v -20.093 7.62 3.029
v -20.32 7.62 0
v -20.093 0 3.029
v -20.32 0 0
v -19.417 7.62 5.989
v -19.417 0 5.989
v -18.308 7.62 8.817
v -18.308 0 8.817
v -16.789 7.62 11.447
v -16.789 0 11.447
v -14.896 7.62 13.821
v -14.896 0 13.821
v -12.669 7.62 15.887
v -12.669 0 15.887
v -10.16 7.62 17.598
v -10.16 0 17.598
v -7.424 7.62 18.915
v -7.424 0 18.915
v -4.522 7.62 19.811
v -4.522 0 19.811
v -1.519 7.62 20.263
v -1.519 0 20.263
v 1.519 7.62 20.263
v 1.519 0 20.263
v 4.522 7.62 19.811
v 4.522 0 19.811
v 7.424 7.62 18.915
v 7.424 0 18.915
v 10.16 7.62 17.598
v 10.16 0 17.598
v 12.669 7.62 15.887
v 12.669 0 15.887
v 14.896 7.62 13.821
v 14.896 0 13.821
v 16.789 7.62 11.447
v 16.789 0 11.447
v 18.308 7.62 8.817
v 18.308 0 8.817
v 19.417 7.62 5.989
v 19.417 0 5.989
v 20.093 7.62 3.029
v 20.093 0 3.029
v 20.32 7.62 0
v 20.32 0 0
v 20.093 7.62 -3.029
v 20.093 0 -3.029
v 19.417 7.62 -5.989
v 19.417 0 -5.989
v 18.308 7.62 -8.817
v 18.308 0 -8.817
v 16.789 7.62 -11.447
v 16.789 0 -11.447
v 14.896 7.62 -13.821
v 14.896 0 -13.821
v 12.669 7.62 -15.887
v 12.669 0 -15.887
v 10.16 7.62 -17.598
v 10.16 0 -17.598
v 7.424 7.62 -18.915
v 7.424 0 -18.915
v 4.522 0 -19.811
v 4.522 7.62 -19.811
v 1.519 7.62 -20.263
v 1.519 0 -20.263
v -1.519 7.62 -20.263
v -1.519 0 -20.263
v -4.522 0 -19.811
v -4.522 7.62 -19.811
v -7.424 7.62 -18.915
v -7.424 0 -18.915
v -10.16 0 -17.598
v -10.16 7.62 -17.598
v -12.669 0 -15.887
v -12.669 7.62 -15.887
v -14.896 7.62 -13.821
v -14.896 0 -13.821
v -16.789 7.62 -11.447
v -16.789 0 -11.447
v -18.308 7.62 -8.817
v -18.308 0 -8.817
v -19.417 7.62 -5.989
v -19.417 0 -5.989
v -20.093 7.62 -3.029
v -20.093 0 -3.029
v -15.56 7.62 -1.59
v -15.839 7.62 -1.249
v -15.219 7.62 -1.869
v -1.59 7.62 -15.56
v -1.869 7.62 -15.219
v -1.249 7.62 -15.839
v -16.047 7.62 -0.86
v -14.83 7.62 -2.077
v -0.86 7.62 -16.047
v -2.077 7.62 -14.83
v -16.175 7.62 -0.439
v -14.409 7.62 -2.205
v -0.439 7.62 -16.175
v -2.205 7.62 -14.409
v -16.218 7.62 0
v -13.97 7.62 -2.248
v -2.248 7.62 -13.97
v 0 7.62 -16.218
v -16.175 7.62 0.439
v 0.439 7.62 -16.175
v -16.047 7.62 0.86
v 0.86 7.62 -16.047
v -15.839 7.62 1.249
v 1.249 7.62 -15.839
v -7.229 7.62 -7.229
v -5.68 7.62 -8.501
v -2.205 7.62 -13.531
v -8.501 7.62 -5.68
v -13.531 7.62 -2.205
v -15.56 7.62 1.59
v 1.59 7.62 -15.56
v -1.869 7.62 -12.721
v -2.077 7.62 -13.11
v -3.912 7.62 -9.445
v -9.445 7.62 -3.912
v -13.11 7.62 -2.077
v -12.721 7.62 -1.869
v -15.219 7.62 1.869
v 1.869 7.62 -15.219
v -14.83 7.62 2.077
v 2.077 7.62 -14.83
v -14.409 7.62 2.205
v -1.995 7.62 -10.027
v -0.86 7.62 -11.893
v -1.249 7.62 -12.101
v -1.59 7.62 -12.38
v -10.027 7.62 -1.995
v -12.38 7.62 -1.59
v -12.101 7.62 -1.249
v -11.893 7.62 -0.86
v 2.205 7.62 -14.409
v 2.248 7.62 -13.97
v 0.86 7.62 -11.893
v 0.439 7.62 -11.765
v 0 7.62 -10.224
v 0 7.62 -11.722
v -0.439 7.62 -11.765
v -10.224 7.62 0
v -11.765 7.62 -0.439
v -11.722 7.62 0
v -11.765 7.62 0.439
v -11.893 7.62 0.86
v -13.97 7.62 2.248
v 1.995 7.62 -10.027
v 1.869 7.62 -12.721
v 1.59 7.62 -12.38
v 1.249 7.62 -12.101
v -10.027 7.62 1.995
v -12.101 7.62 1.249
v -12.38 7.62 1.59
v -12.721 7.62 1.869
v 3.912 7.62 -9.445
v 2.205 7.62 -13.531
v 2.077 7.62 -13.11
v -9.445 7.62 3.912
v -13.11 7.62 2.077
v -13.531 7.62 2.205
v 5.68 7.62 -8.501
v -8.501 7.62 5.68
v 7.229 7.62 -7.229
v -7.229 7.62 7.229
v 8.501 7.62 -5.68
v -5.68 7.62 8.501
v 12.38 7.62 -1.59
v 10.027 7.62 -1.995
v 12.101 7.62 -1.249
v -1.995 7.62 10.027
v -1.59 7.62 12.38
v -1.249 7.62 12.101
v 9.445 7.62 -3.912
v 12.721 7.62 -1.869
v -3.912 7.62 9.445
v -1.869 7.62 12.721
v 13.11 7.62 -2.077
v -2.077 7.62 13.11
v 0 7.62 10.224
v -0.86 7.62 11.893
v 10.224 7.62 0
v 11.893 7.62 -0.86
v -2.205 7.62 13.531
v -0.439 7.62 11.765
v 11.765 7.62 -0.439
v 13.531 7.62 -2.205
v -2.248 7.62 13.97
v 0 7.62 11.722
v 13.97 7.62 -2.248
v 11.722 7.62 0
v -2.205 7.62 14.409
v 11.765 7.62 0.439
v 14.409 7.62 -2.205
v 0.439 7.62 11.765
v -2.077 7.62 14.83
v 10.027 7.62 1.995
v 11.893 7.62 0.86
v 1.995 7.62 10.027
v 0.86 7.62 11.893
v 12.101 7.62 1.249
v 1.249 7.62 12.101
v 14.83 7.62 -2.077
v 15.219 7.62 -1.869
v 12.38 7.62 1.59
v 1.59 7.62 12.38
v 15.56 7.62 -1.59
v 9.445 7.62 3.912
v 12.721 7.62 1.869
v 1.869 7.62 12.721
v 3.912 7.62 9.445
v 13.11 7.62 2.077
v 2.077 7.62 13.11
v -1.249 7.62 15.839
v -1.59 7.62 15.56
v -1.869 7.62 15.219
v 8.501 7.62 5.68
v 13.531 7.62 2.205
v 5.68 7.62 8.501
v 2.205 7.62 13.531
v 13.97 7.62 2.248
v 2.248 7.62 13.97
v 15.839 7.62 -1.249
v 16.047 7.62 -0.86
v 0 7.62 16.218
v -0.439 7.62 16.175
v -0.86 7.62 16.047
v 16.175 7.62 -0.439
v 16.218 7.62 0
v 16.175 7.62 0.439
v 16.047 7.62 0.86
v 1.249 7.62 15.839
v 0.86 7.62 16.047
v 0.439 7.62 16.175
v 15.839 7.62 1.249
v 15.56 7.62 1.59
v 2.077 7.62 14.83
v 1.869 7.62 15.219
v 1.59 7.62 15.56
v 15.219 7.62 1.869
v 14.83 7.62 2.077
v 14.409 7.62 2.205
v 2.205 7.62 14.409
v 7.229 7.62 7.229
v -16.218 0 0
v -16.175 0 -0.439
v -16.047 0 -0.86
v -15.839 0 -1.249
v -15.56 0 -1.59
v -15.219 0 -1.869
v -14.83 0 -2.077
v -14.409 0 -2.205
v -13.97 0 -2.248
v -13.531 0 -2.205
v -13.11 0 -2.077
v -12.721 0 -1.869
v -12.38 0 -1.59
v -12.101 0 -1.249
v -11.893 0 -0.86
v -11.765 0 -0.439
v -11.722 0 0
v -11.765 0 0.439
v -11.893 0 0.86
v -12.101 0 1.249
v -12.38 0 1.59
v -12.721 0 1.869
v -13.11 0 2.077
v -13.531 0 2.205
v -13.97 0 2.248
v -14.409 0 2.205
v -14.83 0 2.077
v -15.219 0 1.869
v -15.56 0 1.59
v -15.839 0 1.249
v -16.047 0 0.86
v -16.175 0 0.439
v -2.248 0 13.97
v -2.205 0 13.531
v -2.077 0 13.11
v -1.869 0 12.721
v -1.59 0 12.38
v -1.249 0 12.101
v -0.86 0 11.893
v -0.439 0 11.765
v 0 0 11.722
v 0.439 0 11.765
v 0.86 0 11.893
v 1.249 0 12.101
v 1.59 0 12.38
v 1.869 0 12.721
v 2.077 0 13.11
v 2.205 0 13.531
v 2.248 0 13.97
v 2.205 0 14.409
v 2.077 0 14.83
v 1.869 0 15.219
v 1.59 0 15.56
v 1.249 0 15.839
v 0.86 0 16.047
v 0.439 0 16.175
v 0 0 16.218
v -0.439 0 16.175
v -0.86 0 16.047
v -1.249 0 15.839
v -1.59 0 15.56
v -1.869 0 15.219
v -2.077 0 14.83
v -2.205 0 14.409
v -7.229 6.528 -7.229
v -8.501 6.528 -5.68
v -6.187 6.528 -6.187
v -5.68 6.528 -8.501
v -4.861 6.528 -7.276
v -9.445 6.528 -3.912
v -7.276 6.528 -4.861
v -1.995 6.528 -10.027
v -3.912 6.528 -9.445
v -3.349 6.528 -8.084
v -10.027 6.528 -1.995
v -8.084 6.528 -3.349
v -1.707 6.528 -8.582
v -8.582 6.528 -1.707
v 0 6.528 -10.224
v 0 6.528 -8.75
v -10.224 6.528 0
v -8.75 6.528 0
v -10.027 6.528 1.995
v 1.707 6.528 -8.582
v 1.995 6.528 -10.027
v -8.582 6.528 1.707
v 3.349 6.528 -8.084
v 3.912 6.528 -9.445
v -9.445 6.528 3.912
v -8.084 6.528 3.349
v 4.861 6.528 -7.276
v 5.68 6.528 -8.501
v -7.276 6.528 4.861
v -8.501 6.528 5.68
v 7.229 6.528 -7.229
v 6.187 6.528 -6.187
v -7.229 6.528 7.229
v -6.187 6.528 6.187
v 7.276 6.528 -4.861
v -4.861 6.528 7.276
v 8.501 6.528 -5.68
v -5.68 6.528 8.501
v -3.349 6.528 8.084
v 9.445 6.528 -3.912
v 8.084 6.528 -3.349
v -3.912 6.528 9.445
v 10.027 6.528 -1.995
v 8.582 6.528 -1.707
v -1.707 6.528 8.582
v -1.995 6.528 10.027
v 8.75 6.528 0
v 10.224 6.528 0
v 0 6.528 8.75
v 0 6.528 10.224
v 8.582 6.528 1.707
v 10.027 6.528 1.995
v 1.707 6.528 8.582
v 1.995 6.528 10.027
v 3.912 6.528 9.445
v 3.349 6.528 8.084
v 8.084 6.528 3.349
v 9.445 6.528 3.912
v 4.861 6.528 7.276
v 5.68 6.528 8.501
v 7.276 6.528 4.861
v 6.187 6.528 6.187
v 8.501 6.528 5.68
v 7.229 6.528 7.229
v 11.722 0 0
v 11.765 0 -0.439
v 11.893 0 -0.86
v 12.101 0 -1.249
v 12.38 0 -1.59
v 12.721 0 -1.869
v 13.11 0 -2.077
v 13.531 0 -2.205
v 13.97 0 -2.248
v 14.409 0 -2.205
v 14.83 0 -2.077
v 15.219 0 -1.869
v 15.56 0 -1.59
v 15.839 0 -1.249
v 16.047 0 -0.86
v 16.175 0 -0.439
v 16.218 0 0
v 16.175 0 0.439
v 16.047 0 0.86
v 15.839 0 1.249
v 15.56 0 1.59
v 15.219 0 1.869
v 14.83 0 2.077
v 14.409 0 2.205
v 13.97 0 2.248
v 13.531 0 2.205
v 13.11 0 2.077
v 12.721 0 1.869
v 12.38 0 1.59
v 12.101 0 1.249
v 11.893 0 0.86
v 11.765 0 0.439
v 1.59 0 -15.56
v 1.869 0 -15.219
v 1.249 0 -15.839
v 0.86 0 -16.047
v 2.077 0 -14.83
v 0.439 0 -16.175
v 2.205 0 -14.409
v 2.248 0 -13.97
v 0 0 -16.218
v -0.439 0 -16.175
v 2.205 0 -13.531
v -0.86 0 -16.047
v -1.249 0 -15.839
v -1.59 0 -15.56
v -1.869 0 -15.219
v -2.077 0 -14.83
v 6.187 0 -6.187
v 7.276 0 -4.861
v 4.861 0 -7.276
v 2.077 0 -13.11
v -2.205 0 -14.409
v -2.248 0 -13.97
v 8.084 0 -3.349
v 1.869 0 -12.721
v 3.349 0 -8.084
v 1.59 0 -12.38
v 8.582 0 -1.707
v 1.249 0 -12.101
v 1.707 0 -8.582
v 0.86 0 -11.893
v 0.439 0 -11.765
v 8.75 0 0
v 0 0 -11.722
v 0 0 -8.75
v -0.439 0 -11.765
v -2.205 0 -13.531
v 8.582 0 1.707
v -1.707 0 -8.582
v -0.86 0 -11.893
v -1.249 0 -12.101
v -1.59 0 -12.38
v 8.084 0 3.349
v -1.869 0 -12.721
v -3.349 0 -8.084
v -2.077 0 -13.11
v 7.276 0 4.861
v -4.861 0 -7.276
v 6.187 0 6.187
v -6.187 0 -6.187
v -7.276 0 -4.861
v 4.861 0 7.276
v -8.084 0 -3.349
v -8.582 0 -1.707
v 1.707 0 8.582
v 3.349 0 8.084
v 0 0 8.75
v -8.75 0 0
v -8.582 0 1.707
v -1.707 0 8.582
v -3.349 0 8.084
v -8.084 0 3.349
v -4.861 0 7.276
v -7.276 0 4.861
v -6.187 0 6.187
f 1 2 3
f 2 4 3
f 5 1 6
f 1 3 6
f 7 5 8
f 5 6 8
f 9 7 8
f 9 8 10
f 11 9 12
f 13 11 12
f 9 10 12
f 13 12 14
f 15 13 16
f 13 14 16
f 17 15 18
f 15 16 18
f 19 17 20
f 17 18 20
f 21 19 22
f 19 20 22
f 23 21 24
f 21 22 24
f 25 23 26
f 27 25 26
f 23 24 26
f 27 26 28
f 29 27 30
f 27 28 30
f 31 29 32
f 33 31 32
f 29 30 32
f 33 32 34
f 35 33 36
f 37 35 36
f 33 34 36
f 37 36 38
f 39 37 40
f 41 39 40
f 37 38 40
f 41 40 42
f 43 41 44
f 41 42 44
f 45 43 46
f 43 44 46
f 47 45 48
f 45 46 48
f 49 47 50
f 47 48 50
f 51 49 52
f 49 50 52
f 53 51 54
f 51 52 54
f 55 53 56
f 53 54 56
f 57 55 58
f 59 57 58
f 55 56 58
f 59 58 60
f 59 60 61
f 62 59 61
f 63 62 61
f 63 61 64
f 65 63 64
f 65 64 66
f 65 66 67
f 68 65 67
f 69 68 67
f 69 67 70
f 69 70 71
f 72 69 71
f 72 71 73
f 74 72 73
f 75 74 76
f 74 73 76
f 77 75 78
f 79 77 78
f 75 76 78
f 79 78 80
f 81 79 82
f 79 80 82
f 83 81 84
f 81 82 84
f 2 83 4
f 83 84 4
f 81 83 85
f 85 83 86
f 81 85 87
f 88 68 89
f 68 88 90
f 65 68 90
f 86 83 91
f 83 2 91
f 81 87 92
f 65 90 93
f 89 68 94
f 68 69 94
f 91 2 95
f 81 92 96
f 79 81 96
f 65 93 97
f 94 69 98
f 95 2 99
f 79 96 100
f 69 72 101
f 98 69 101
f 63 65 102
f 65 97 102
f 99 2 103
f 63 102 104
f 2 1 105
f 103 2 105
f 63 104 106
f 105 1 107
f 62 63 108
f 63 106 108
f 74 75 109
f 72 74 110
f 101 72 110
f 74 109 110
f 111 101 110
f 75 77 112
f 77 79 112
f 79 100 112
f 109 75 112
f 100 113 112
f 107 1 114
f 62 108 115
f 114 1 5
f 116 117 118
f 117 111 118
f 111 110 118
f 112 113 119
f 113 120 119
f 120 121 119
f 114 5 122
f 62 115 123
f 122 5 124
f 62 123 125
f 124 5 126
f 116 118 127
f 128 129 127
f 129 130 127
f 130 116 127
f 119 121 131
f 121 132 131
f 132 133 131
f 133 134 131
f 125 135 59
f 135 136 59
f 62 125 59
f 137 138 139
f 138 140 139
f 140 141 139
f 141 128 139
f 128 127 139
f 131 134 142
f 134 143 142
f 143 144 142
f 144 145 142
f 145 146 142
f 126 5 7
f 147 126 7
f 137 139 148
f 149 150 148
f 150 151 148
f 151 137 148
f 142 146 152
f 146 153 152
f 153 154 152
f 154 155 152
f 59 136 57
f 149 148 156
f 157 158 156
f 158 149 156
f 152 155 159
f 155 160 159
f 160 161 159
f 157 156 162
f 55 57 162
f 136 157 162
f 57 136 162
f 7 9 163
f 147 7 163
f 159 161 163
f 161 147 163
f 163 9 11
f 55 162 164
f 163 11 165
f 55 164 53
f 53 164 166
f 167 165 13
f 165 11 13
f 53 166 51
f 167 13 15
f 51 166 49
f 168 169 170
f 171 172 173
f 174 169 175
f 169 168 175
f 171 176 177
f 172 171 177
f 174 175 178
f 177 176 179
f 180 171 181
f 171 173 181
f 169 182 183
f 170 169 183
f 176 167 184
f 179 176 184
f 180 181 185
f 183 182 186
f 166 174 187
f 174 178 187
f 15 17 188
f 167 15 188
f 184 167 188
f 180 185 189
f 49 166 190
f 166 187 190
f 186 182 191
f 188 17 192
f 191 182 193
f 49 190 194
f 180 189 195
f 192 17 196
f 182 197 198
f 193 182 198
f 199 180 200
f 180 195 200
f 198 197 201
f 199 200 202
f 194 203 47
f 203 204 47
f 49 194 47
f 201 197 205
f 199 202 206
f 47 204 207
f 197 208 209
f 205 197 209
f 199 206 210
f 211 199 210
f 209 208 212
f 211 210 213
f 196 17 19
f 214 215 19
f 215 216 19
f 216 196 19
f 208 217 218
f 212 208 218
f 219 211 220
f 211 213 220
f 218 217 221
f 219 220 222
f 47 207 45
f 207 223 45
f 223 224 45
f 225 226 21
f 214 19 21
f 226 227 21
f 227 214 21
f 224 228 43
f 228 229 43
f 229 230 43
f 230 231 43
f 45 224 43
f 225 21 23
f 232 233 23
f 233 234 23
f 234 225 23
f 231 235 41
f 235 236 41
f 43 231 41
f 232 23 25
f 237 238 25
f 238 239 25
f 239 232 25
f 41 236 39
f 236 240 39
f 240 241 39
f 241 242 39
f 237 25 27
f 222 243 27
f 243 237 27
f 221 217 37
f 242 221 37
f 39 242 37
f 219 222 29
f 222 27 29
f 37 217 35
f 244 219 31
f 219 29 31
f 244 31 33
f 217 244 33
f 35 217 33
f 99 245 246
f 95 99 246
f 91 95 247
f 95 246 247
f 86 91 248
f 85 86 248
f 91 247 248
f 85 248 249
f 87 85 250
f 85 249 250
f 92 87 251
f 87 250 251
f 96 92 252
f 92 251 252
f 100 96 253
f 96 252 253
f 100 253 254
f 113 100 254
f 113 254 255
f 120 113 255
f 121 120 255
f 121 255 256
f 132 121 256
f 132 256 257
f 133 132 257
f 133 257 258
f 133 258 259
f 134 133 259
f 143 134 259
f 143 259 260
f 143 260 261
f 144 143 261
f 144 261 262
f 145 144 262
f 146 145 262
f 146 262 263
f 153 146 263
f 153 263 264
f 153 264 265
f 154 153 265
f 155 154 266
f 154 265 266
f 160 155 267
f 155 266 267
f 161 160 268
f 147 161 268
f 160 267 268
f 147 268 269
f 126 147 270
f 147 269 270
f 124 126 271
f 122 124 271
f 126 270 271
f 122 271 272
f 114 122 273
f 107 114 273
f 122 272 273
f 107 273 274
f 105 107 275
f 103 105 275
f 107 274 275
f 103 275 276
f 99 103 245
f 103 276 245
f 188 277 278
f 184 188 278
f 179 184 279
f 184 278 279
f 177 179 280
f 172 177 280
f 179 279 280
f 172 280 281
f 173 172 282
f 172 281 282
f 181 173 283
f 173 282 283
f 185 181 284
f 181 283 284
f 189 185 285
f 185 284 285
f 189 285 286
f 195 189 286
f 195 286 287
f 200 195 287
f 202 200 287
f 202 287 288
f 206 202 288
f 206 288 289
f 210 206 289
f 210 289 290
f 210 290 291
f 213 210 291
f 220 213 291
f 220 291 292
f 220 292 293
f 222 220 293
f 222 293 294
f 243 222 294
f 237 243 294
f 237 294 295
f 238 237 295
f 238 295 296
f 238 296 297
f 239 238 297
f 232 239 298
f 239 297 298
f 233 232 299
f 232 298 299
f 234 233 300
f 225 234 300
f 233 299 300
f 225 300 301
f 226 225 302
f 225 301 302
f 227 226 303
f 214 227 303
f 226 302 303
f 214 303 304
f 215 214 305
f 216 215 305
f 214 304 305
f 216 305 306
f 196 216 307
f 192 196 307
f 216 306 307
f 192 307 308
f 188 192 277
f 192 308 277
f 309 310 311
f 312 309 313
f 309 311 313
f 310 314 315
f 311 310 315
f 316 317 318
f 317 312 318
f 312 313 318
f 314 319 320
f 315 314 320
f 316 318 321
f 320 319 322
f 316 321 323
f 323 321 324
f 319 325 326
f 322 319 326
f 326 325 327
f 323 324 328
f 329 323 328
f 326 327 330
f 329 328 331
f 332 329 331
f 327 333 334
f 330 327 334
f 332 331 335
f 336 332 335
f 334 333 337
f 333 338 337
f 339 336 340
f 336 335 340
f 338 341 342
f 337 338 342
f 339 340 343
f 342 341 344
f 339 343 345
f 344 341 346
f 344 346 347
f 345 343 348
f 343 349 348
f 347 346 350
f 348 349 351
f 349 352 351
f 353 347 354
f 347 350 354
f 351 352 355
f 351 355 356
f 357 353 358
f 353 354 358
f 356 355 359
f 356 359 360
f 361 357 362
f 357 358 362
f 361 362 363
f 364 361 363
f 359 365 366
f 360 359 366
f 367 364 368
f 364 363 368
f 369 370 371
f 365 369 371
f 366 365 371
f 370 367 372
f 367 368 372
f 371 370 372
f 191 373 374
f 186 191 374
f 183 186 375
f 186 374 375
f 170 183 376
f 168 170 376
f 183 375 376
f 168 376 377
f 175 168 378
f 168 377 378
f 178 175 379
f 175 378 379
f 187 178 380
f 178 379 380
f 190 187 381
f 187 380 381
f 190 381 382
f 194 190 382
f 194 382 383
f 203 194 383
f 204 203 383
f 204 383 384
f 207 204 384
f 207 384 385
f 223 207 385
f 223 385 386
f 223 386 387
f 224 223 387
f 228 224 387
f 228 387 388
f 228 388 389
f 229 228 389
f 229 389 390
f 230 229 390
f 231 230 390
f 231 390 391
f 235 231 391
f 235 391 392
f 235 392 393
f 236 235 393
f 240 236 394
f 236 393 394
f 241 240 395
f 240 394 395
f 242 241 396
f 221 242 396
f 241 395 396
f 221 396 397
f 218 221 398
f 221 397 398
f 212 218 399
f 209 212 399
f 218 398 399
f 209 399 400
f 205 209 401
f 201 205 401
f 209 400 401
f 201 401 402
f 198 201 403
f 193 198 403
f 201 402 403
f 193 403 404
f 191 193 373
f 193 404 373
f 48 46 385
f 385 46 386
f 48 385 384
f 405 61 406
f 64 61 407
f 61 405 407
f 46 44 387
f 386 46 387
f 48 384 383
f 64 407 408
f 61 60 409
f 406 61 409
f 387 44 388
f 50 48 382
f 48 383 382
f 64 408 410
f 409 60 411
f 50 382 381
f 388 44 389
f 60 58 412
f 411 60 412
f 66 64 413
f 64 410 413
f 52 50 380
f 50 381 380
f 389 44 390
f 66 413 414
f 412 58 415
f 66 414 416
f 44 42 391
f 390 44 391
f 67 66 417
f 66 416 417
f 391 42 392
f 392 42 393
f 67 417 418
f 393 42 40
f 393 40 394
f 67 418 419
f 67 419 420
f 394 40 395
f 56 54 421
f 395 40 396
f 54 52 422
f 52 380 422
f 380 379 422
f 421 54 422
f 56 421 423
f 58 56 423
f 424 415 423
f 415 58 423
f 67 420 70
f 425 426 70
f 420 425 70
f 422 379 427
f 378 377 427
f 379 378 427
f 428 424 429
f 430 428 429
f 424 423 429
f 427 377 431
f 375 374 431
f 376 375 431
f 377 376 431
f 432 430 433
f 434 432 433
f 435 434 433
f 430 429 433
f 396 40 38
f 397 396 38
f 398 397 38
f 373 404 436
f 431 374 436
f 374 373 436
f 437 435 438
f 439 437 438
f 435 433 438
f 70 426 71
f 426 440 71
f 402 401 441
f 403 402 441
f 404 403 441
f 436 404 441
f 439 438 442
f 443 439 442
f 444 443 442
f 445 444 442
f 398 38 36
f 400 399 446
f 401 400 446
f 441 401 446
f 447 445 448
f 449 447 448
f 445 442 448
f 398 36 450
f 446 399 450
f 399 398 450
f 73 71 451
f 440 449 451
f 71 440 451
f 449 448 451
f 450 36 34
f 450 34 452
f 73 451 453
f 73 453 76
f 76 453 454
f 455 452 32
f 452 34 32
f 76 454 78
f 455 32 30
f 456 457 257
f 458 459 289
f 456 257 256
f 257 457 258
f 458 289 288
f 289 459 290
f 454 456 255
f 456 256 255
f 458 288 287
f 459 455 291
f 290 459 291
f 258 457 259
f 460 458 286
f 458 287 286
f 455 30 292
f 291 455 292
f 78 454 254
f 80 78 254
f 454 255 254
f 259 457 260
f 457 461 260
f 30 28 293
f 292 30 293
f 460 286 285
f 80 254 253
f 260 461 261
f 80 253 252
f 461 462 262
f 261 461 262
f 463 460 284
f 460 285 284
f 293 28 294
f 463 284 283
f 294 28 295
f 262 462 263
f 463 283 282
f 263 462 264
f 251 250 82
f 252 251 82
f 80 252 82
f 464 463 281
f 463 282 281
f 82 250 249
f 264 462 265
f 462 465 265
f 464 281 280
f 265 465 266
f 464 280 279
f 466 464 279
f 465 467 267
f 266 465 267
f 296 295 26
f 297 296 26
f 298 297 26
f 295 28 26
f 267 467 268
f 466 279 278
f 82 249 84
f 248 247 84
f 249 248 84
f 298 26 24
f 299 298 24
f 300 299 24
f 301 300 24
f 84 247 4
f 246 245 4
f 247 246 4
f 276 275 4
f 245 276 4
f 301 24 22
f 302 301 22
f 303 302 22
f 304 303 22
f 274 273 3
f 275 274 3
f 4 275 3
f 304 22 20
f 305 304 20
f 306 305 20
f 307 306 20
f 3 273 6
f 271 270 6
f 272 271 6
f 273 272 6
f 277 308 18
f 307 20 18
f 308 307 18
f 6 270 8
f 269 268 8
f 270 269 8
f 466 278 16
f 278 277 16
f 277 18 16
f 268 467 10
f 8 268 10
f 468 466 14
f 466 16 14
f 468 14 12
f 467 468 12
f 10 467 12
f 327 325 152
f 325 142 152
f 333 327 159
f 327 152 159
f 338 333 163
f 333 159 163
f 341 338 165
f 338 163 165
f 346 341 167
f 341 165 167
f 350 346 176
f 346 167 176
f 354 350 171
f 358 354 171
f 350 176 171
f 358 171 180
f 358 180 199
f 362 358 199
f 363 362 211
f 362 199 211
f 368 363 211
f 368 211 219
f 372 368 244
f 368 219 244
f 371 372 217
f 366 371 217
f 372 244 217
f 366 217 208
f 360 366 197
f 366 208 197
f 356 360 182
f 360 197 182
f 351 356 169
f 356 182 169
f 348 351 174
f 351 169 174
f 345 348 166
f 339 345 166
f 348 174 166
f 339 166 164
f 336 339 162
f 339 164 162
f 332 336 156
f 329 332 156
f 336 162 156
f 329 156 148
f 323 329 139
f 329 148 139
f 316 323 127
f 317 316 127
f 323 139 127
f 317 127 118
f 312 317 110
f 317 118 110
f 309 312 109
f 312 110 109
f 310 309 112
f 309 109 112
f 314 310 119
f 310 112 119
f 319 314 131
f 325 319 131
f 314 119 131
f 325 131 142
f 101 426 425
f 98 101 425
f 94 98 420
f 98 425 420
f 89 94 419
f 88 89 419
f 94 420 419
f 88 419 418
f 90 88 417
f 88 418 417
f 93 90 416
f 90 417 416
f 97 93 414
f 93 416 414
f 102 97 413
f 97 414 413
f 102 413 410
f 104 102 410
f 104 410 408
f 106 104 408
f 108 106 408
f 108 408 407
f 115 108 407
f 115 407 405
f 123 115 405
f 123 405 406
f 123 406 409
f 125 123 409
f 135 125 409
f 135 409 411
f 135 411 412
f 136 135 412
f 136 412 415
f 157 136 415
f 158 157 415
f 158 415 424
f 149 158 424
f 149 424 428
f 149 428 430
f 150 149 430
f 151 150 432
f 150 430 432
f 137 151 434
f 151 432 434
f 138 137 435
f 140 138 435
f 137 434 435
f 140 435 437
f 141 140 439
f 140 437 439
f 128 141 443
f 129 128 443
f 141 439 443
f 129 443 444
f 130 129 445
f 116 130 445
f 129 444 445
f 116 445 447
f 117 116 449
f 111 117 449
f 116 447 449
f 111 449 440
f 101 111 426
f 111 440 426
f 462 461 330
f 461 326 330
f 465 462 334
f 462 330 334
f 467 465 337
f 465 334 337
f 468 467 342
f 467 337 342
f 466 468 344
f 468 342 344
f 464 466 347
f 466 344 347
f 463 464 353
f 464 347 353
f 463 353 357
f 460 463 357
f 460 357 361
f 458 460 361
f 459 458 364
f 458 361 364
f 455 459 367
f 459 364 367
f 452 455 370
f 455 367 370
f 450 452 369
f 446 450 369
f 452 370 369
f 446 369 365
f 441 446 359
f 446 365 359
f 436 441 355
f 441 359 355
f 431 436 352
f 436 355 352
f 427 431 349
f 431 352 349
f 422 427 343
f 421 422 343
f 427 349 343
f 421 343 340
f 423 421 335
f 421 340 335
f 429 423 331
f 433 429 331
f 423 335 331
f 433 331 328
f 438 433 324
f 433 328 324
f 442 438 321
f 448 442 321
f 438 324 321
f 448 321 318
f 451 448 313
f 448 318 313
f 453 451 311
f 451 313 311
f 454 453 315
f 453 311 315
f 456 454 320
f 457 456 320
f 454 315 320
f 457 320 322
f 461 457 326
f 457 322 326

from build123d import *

# Parameters (mm, degrees)
F_8_CLEARANCE_HOLE1_D = 4.4958


with BuildPart() as part:
    # Sketch1 → Revolve1 (revolve)
    with BuildSketch(Plane.XY):
        Polygon((-20.32, 7.62), (-20.32, 0), (-8.7503, 0), (-8.7503, 6.5278), (-10.2235, 6.5278), (-10.2235, 7.62), align=None)
    revolve(axis=Axis((0, 0, 0), (0, 1, 0)))

    # #8 Clearance Hole1 (through all)
    with Locations(Plane(origin=(0, 7.62, 0), x_dir=(1, 0, 0), z_dir=(0, 1, 0))):
        with Locations((13.97, 0), (0, 13.97), (-13.97, 0), (0, -13.97)):
            Hole(F_8_CLEARANCE_HOLE1_D / 2)


solid = part.part
